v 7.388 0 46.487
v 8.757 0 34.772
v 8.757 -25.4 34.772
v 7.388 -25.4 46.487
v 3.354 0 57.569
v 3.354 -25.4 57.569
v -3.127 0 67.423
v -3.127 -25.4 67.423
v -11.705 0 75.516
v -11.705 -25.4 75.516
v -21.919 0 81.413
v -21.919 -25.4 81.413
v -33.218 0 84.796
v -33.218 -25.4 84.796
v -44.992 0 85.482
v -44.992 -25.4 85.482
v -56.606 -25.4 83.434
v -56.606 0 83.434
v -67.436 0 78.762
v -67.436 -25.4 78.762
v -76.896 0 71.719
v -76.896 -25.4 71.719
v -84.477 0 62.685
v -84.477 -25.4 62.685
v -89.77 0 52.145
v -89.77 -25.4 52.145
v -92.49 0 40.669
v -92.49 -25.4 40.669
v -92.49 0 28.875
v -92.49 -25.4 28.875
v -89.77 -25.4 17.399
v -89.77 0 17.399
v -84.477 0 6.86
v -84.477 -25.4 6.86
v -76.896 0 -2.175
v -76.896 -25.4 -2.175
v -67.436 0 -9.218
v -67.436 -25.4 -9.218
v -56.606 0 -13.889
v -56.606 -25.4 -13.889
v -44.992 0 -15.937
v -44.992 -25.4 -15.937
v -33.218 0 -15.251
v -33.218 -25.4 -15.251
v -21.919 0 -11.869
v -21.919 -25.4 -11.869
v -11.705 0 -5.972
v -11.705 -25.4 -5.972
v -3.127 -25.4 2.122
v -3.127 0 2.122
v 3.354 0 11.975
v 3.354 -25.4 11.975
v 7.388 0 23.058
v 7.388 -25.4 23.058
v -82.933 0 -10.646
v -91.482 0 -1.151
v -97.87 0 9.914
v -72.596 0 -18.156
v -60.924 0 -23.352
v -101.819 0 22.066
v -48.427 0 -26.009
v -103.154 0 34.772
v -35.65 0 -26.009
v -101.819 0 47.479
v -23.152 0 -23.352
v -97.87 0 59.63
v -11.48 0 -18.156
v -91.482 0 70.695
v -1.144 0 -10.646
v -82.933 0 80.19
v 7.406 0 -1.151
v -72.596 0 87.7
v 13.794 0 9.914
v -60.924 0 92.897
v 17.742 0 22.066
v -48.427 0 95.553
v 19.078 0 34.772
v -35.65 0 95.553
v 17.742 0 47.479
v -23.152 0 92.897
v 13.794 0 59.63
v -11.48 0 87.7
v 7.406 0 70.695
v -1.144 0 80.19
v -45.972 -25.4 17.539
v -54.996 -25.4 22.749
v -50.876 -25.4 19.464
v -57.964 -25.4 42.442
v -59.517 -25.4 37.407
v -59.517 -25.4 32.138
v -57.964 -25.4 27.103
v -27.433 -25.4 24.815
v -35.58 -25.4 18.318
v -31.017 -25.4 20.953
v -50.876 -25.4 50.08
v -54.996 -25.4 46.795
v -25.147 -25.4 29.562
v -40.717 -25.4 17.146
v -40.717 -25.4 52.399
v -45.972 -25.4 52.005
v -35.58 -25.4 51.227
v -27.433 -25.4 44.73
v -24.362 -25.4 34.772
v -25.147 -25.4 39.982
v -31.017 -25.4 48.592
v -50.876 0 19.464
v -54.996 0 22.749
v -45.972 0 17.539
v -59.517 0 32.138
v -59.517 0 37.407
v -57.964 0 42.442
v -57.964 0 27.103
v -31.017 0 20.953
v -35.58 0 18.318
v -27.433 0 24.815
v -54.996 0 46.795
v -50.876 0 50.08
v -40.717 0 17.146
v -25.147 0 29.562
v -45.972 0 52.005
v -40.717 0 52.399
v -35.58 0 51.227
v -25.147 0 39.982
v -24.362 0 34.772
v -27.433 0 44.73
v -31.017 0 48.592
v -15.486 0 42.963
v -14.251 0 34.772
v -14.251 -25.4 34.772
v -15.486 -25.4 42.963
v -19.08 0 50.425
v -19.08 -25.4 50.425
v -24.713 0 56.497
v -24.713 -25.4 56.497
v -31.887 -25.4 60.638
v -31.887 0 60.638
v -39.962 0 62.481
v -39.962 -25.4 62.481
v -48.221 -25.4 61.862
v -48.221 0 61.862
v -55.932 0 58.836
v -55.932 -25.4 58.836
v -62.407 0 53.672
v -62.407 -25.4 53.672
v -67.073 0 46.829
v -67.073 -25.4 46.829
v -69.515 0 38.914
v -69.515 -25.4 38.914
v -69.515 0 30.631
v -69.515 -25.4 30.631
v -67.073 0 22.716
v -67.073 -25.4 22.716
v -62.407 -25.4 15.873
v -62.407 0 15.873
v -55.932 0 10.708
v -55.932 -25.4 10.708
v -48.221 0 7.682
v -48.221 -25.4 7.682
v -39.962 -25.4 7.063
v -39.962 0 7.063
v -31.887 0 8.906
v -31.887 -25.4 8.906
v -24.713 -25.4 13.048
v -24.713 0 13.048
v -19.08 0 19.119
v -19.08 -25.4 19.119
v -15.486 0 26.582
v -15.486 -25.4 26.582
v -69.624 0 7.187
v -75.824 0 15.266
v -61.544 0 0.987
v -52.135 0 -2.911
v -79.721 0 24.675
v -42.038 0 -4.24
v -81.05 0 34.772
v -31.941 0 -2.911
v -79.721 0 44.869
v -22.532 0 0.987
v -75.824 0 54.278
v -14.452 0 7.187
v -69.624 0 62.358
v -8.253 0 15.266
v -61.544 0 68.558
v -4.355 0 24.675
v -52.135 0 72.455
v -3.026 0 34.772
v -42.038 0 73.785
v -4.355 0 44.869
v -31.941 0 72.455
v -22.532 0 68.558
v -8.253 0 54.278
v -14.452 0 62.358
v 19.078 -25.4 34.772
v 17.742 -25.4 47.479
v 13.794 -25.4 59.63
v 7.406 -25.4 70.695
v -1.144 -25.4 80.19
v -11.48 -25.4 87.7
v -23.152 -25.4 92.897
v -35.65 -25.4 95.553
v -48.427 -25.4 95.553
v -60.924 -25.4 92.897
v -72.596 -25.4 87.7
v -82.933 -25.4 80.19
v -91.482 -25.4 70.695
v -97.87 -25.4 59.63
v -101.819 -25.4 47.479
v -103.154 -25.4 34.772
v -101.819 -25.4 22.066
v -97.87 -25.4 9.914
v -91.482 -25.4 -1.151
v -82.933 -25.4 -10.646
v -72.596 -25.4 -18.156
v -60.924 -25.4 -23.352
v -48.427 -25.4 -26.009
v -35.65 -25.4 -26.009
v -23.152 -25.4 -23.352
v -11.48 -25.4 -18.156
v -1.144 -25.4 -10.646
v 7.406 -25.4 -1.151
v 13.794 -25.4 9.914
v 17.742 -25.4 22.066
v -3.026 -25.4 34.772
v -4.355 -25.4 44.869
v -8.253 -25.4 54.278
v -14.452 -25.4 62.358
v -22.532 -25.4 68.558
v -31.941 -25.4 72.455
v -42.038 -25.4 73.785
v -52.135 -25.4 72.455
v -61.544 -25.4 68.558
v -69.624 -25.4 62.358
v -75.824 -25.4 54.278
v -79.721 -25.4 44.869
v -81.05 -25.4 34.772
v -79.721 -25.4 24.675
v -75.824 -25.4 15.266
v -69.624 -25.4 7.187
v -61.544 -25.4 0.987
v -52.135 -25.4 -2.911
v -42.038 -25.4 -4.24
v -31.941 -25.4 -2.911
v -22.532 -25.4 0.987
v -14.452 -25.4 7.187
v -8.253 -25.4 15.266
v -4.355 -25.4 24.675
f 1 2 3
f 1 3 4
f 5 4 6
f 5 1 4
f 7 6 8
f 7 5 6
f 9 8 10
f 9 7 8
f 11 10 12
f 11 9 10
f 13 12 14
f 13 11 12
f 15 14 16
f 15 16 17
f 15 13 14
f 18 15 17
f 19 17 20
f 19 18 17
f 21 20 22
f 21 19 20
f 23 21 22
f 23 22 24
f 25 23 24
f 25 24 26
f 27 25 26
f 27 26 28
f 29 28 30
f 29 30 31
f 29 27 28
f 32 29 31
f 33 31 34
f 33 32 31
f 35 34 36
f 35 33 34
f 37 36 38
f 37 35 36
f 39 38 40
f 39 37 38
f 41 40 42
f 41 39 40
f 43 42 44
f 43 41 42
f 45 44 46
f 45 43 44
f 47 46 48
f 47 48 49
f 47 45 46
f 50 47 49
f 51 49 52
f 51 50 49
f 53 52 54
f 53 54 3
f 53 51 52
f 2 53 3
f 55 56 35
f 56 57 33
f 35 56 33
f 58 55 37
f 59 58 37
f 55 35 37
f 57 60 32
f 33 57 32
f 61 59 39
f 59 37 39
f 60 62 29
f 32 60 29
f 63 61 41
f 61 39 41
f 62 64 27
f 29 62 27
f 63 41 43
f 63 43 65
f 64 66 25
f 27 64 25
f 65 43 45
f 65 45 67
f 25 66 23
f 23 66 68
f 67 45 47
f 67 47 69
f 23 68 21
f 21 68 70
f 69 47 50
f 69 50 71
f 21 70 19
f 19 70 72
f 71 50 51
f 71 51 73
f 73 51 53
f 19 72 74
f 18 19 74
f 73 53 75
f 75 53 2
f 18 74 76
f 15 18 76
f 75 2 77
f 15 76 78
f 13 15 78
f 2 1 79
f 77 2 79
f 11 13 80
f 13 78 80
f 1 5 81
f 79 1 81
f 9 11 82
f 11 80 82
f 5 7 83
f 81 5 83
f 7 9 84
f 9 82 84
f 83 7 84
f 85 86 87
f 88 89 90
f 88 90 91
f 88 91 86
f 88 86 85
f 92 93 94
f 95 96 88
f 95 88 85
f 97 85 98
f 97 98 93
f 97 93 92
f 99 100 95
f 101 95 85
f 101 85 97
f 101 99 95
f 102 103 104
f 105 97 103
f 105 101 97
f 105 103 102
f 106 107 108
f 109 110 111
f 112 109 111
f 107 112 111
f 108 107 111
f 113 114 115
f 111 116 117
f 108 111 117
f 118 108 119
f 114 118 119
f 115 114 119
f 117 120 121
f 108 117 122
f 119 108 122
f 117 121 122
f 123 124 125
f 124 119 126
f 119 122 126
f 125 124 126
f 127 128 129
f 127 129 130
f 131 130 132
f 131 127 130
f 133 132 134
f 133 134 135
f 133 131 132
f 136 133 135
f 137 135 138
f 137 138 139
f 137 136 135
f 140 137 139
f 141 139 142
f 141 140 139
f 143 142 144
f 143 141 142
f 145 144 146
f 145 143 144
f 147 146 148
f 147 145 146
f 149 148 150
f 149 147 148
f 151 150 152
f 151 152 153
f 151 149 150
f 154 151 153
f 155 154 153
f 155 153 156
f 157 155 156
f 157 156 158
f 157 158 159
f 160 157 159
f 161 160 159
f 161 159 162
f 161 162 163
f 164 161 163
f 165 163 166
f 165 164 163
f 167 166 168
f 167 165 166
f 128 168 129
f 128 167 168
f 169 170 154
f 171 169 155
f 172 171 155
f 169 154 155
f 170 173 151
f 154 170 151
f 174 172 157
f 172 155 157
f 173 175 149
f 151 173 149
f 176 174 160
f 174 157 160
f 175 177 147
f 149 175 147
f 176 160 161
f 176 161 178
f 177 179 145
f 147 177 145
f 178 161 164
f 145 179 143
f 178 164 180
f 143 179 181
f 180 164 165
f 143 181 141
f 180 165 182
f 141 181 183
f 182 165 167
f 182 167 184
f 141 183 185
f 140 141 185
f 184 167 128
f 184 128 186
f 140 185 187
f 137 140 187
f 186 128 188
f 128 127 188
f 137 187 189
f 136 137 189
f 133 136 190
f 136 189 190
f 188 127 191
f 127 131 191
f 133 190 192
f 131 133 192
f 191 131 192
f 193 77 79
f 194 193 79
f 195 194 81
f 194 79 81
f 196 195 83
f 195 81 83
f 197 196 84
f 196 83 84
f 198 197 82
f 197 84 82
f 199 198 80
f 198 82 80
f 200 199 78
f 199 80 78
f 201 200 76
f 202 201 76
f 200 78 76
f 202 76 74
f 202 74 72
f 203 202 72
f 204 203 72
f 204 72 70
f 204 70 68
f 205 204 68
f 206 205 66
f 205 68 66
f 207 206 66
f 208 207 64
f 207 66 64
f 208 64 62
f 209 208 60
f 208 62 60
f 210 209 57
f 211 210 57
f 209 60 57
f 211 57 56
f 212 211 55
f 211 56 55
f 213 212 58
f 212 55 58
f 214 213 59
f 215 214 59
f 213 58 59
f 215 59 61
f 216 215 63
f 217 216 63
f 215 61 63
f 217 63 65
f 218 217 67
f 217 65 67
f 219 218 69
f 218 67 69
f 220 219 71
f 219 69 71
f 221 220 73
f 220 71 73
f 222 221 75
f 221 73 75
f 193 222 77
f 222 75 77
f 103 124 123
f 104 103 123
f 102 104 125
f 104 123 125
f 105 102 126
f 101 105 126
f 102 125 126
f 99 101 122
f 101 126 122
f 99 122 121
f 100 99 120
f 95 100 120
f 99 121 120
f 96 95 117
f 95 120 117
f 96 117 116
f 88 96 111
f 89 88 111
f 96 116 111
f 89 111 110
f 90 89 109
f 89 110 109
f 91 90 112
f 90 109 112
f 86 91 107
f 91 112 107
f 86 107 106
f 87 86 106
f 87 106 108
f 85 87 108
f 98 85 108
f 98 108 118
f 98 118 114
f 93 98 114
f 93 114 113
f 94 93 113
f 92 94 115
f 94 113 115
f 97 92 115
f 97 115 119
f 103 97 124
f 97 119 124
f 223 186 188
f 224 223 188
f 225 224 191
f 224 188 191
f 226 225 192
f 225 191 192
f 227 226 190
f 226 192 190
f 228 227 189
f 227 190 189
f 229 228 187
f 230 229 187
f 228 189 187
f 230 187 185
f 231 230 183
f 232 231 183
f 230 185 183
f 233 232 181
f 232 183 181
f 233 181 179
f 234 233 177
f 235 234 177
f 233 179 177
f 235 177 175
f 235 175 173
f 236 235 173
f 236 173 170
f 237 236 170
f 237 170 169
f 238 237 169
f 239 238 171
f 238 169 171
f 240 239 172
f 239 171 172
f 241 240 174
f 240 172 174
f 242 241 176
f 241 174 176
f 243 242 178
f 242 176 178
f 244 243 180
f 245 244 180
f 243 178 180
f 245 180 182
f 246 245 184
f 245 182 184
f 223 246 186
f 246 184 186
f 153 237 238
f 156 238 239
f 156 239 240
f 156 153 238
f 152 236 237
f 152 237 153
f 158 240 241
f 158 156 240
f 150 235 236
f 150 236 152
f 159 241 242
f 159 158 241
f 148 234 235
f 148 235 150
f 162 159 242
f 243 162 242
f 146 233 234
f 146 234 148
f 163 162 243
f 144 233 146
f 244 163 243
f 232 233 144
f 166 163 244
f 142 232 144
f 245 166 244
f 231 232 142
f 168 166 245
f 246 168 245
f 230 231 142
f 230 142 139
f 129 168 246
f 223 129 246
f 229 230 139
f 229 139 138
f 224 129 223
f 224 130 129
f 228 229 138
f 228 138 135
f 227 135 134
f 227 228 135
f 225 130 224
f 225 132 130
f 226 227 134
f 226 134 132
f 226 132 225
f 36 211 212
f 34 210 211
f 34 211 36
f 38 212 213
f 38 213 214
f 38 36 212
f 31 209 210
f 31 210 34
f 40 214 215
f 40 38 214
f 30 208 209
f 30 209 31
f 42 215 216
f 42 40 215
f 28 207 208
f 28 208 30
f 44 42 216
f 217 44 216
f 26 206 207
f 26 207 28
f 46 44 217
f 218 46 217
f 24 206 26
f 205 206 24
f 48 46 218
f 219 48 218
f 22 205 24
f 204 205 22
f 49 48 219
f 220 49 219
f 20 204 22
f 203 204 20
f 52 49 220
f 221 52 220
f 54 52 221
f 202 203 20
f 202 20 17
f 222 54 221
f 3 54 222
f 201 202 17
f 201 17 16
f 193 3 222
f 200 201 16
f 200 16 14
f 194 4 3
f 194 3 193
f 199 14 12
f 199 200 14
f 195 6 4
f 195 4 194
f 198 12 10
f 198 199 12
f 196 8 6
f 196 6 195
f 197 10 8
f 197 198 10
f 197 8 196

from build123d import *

# Parameters (mm, degrees)
F0_R     = 61.1158854905
F0_R_2   = 50.7952907718
F1_DEPTH = 25.4
F0_R_3   = 17.6761672641
F0_R_4   = 39.0121695128
F0_R_5   = 27.7868027827


with BuildPart() as f1:
    # F0 (on Front) → F1 (new body)
    with BuildSketch(Plane.XZ):
        with Locations((-42.0382060111, 34.7723402083)):
            Circle(F0_R)
        with Locations((-42.0382060111, 34.7723402083)):
            Circle(F0_R_2, mode=Mode.SUBTRACT)
    extrude(amount=F1_DEPTH)


with BuildPart() as f1b:
    # F0 (on Front) → F1, piece 2 (new body)
    with BuildSketch(Plane.XZ):
        with Locations((-42.0382060111, 34.7723402083)):
            Circle(F0_R_3)
    extrude(amount=F1_DEPTH)


with BuildPart() as f1c:
    # F0 (on Front) → F1, piece 3 (new body)
    with BuildSketch(Plane.XZ):
        with Locations((-42.0382060111, 34.7723402083)):
            Circle(F0_R_4)
        with Locations((-42.0382060111, 34.7723402083)):
            Circle(F0_R_5, mode=Mode.SUBTRACT)
    extrude(amount=F1_DEPTH)


solid = Compound([f1.part, f1b.part, f1c.part])
